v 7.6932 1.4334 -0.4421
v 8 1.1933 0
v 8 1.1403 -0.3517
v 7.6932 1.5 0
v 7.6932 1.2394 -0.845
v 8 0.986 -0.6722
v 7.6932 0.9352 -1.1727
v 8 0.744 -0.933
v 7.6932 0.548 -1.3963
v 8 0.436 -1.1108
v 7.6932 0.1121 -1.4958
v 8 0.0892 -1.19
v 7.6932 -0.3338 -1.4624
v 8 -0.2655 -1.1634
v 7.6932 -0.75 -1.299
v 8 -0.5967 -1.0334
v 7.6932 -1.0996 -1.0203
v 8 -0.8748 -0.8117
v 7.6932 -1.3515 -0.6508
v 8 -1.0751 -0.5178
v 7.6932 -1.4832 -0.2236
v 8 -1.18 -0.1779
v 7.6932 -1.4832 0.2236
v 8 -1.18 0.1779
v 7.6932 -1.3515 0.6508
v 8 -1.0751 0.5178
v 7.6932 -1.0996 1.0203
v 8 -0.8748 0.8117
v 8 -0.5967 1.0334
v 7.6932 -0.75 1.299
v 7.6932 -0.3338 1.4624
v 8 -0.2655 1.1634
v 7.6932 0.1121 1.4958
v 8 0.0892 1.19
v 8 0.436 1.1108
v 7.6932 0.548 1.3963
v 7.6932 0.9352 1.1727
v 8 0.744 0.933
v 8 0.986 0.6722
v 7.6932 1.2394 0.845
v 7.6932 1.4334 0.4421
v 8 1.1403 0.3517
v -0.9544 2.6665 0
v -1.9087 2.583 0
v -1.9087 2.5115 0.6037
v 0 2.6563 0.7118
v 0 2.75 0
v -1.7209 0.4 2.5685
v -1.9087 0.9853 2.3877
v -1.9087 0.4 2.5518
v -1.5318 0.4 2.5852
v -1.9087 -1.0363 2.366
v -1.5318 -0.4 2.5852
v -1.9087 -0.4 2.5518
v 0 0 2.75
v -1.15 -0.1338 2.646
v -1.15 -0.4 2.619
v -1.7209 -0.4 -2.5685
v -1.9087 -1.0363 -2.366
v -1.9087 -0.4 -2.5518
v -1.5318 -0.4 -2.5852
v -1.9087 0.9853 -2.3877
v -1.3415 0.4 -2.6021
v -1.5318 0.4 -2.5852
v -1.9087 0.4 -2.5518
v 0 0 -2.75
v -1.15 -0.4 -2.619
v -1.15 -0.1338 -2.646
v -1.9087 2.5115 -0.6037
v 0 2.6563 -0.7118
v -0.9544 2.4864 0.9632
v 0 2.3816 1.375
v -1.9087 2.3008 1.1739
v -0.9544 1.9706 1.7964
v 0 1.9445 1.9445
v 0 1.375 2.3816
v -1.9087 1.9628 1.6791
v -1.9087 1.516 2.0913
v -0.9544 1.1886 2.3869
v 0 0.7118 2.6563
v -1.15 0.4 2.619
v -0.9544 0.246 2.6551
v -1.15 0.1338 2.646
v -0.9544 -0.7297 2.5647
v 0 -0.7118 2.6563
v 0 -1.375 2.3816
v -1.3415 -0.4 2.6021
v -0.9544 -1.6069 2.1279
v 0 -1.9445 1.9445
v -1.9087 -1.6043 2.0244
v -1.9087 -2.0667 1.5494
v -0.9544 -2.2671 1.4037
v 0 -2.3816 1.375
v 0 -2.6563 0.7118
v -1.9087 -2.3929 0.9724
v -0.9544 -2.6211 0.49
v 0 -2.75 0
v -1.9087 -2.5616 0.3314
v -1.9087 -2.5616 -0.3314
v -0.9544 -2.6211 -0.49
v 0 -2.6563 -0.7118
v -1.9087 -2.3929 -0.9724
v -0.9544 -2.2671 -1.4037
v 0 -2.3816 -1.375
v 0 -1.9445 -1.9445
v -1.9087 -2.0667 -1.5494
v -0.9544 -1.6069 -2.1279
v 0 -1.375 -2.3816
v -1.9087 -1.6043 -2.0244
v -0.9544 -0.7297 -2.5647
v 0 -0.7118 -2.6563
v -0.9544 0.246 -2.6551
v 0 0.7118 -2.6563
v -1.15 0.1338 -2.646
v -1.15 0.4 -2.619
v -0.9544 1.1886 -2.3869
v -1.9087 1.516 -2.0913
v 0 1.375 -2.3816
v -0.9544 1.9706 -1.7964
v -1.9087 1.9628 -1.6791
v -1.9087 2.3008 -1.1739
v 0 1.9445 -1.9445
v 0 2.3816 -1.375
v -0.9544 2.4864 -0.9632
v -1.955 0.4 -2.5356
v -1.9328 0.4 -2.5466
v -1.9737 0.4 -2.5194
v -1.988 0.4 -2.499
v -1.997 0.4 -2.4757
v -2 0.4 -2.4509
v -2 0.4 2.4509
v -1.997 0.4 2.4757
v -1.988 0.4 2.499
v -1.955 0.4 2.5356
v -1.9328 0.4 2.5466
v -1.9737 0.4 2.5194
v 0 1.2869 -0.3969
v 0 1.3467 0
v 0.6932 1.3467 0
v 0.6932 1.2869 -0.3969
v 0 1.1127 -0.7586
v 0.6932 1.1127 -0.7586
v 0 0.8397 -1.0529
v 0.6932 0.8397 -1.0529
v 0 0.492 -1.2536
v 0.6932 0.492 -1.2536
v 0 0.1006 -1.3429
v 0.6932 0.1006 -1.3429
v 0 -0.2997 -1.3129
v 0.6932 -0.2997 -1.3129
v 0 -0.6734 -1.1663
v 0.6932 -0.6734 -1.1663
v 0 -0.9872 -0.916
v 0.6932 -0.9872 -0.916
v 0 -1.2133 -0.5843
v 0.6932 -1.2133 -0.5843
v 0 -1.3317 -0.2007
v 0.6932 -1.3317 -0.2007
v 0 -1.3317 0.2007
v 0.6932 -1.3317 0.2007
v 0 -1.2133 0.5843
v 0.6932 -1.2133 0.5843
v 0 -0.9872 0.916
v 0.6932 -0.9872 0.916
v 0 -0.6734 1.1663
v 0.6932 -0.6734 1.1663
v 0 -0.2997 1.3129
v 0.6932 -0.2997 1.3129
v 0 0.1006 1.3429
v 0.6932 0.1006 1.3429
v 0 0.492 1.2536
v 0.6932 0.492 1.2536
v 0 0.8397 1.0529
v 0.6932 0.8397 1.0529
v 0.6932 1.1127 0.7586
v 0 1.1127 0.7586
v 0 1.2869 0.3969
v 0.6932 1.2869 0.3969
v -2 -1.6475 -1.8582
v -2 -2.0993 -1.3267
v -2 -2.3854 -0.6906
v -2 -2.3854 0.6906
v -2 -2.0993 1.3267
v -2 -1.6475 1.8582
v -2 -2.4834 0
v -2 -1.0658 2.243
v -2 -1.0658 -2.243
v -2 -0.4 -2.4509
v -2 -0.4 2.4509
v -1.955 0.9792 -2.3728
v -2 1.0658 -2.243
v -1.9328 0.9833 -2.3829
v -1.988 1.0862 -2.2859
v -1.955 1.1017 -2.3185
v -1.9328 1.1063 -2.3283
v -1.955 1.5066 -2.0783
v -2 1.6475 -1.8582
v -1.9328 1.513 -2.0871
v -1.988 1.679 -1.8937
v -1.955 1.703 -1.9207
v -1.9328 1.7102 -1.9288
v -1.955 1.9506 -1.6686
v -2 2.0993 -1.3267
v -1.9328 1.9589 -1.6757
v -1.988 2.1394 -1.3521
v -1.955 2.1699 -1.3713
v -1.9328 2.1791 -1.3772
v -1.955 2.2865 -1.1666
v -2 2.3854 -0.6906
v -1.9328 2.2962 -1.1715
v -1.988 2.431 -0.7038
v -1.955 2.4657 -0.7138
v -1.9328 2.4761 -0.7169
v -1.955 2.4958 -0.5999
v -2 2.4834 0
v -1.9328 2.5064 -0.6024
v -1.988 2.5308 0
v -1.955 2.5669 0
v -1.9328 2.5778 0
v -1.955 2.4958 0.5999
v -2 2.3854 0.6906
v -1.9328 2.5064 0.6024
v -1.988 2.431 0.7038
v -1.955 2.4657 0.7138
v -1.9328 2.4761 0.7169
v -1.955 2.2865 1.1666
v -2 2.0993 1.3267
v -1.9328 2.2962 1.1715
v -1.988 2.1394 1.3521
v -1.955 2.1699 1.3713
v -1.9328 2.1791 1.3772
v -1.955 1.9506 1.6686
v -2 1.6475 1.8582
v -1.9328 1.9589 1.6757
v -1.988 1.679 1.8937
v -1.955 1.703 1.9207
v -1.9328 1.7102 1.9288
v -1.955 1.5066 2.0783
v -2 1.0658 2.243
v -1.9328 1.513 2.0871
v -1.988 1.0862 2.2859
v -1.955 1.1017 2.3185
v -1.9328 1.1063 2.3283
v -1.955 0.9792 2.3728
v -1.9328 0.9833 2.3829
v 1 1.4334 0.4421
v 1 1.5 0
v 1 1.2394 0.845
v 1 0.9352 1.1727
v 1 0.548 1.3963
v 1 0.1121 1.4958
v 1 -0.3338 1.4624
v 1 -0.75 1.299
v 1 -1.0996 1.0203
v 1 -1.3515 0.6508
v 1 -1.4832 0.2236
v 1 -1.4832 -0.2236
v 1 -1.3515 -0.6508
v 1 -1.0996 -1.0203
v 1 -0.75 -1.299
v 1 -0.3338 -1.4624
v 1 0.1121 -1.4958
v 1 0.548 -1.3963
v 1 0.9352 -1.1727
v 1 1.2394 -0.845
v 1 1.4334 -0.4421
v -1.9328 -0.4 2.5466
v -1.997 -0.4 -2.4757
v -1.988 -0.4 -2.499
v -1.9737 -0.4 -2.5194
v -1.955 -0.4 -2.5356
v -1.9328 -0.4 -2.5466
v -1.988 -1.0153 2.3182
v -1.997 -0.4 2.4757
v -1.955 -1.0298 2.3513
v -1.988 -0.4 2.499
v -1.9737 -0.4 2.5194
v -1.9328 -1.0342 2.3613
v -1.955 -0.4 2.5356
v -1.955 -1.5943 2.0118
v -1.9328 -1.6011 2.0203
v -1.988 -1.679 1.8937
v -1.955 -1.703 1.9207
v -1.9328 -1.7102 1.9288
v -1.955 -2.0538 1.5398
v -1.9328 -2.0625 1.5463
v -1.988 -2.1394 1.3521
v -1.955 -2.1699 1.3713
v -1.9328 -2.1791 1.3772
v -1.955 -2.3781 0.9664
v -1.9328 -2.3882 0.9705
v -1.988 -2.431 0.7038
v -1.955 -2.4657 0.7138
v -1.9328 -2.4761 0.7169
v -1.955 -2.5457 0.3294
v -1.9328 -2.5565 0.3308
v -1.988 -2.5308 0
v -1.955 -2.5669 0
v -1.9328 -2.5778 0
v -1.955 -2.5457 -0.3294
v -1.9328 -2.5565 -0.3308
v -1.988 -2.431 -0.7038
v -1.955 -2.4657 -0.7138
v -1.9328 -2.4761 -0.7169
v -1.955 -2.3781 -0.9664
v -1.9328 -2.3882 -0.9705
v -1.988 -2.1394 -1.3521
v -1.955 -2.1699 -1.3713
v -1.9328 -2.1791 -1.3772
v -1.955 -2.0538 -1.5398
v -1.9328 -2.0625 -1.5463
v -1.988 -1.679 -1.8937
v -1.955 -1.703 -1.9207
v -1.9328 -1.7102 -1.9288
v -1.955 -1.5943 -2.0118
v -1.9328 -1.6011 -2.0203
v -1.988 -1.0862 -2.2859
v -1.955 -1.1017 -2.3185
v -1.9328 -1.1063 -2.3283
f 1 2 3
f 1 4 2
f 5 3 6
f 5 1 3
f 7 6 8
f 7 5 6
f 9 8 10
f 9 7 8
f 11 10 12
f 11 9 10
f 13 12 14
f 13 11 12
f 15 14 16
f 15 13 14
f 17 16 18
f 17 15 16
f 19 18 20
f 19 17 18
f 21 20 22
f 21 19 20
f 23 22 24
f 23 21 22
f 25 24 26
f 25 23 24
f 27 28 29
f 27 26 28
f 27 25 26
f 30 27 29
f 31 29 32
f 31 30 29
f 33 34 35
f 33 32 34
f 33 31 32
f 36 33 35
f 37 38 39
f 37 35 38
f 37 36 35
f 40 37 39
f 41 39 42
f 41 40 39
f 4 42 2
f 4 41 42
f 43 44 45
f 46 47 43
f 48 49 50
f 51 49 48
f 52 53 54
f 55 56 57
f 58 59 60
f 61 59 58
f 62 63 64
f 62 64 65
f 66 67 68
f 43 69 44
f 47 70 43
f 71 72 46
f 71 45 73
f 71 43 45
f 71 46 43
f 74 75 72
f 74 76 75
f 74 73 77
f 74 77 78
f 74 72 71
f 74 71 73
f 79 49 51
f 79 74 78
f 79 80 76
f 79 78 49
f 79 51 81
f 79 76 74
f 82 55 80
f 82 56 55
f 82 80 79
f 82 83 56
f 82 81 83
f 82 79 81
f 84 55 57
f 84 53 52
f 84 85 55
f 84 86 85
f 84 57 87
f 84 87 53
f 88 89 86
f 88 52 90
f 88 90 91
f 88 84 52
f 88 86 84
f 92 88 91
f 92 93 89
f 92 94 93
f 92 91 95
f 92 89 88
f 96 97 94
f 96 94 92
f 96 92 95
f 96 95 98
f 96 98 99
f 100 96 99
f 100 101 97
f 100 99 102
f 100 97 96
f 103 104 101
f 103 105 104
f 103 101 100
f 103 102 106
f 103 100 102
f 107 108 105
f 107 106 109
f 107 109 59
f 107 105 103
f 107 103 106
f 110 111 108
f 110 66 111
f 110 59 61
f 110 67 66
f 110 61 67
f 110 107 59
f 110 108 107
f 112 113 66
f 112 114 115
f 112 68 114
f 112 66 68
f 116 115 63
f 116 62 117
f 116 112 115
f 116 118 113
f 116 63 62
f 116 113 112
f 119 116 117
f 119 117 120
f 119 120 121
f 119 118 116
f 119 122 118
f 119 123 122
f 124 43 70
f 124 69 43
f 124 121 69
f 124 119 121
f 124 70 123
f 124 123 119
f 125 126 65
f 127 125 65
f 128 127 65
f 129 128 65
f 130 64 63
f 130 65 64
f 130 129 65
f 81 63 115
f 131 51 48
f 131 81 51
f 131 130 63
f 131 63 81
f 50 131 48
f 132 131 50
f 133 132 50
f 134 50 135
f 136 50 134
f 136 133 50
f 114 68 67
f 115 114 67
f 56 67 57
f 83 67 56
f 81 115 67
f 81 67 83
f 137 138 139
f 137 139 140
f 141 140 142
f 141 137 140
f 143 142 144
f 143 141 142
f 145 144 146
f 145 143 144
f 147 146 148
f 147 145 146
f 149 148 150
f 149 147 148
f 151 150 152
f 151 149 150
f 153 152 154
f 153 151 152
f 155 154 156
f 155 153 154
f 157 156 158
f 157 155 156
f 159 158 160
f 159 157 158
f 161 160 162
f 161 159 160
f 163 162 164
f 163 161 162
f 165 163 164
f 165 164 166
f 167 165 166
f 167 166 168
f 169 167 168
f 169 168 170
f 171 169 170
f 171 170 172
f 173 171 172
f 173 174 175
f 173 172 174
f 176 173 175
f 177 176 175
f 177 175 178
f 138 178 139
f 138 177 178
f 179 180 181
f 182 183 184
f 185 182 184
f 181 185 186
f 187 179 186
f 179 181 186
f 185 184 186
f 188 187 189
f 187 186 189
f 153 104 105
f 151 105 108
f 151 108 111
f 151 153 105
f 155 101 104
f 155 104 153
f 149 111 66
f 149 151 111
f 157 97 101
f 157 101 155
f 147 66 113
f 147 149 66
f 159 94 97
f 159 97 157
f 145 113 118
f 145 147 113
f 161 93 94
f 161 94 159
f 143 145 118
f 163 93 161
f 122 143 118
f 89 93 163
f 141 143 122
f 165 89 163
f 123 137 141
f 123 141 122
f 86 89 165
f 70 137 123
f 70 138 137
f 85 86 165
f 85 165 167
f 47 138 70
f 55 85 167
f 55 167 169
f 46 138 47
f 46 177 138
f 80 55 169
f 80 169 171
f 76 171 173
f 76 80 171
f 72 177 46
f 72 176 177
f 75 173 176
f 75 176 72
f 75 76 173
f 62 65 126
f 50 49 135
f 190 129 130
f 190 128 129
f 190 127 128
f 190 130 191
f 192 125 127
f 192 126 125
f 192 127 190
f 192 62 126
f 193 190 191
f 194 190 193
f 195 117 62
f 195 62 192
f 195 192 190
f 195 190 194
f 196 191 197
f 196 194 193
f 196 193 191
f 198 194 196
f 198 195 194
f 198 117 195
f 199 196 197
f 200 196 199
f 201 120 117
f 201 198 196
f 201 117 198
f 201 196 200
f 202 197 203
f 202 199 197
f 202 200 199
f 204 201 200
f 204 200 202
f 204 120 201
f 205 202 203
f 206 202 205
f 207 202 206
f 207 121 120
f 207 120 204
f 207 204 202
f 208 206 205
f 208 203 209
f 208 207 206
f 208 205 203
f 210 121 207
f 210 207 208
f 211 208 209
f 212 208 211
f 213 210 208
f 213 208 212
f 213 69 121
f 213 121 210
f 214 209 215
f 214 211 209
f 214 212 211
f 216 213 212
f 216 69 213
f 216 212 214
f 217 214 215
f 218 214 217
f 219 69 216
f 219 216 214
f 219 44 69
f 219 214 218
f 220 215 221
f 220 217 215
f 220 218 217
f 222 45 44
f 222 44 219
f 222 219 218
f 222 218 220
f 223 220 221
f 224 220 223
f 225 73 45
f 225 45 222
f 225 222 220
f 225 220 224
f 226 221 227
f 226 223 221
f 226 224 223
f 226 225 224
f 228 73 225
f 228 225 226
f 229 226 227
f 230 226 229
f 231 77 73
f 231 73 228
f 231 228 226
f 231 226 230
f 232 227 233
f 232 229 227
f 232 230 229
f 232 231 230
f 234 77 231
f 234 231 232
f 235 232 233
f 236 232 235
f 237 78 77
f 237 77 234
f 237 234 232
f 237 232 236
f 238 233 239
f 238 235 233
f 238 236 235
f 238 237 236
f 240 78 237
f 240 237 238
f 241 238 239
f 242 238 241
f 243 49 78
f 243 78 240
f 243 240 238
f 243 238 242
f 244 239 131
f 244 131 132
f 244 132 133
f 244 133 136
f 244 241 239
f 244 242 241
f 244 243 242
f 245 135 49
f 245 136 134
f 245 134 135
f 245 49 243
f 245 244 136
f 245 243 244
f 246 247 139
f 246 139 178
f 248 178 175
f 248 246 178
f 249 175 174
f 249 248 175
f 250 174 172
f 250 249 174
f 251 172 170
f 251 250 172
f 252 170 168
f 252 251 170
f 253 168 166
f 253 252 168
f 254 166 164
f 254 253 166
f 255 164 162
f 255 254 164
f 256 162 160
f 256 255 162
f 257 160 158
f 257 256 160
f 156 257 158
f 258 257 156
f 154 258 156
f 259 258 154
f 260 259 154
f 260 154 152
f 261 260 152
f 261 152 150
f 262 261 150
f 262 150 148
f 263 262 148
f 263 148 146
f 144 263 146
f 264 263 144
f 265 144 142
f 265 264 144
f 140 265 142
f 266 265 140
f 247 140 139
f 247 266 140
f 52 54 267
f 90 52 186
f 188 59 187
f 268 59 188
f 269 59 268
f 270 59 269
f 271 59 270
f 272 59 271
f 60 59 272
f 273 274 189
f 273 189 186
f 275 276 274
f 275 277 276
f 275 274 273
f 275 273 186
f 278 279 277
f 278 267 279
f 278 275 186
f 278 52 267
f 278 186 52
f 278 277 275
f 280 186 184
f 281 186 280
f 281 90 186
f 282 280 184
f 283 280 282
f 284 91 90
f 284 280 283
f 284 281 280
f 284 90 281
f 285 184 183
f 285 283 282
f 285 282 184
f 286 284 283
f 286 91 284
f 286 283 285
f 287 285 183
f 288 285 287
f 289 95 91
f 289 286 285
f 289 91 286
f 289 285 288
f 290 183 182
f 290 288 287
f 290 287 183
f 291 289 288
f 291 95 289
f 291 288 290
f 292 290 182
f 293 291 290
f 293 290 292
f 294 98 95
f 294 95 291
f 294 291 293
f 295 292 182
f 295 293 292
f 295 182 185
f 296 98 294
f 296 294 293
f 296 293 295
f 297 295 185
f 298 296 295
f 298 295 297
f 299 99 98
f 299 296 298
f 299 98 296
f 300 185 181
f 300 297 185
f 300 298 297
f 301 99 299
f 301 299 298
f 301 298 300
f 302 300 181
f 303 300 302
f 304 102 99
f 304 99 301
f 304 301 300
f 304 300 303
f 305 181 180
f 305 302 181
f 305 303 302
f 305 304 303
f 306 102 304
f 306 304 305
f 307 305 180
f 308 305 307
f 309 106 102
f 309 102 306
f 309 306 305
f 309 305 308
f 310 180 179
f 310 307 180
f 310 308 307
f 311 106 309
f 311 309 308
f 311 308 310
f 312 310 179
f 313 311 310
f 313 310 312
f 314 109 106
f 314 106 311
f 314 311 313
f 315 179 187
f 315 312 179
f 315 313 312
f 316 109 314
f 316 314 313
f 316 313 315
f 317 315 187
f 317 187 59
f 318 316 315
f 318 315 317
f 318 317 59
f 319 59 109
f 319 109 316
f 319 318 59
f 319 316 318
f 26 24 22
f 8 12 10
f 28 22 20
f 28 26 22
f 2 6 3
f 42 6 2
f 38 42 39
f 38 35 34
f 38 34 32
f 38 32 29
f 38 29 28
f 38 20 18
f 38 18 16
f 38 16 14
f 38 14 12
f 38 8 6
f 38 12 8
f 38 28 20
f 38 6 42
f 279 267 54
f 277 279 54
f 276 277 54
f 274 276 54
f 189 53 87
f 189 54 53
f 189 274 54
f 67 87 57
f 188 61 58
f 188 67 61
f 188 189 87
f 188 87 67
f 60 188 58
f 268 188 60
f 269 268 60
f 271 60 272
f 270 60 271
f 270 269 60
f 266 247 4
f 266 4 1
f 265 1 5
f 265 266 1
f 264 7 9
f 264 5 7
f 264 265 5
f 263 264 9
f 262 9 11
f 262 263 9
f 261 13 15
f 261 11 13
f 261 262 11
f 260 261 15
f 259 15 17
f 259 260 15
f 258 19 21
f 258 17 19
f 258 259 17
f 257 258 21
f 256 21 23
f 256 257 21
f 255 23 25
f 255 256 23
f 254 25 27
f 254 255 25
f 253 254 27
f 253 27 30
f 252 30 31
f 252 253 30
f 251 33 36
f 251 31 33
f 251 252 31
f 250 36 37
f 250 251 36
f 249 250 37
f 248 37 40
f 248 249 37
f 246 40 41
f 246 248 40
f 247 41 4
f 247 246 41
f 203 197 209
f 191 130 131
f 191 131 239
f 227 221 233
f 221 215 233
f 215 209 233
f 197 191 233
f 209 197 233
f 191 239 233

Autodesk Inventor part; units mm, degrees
ref_plane "YZ Plane" through (0, 0, 0) normal (1, 0, 0) x (0, 1, 0)
ref_plane "XZ Plane" through (0, 0, 0) normal (0, 1, 0) x (-1, 0, 0)
sketch "Sketch1" plane through (0, 0, 0) normal (0, 0, 1) x (1, 0, 0)
  line L0 (-2, 0) -> (8, 0)
  line L1 (8, 0) -> (8, 1.5)
  line L2 (8, 1.5) -> (1, 1.5)
  line L3 (1, 1.5) -> (0.6932, 1.3467)
  line L4 (0.6932, 1.3467) -> (0, 1.3467)
  line L5 (0, 1.3467) -> (0, 2.75)
  line L6 (-4, 0) -> (10, 0) projected
  line L7 (0, -0.55) -> (0, 3.3) projected
  line L8 (-2, 0) -> (-2, 2.575)
  line L9 (0, 2.75) -> (-2, 2.575)
  line L10 (1, 1.5) -> (0, 1.5) construction
  dimension "d0" = 8
  dimension "d1" = 7
  dimension "d2" = 0.3068
  dimension "d3" = 2
  dimension "d4" = 3
  dimension "d5" = 2.6935
  dimension "d9" = 5.5
  dimension "d10" = 5
revolve "Body" add sketch "Sketch1" angle 360 about axis through (-2, 0, 0) along (1, 0, 0)
sketch "Sketch2" plane through (-2, 0, 0) normal (-1, 0, 0) x (0, 0, 1)
  circle A0 centre (0, 0) radius 2.75 projected
  line L0 (0, 0) -> (0, 2.575) projected
  line L1 (-2.75, 0.4) -> (2.75, 0.4)
  line L2 (2.75, 0.4) -> (2.75, -0.4)
  line L3 (2.75, -0.4) -> (-2.75, -0.4)
  line L4 (-2.75, -0.4) -> (-2.75, 0.4)
  line L5 (-2.75, 0) -> (2.75, 0) construction
  line L6 (0, 0.4) -> (0, -0.4) construction
  dimension "d11" = 0.8
  dimension "d12" = 5.5
fillet "Fillet1" radius 0.1 1 edges at (-2, -2.575, 0)
extrude "Slot" cut sketch "Sketch2" against normal blind 0.85 contours A0 L3 L1 | L2 L3 A0 | A0 L1 L2 | A0 L4 L1 | L3 L4 A0
thread "Thread" size "M3x0.5" class "6g" standard "ISO Metric profile" length 7
chamfer "Chamfer1" distance 0.3067 distance2 0.3068 1 edges at (8, -1.5, 0) measured on face at (8, 0.417, 0.2189)
ref_plane "Work Plane1" through (30.1625, 0, 0) normal (0, 0, -1) x (1, 0, 0)
equation "\"d11\" = SBR"
equation "\"d12\" = KOD"
equation "\"d19\" = STI"
equation "\"d14\" = RR"
equation "\"d15\" = GEL"
equation "\"d17\" = -0.5 * SPD + 0.5 * GD"
equation "\"d0\" = NLG"
equation "\"d1\" = GEL"
equation "\"d3\" = KOH"
equation "\"d4\" = GD"
equation "\"d5\" = BDM"
equation "\"d9\" = KOD"
equation "\"d10\" = KEWI"
equation "\"GD\" = NND"
equation "\"NLG\" = 8"
equation "\"GEL\" = 7"
equation "\"KOD\" = 5.5"
equation "\"KOH\" = 2"
equation "\"GAL\" = 0.61345 * PTC"
equation "\"SPD\" = NND - 1.2269 * PTC"
equation "\"BDM\" = 2.6935"
equation "\"GUL\" = 0.61345 * PTC"
equation "\"RR\" = 0.1"
equation "\"SBR\" = 0.8"
equation "\"STI\" = 0.85"
equation "\"KEWI\" = 5deg"
equation "\"PTC\" = 0.5"
equation "\"THREADDIA\" = 3"
equation "\"TOA\" = 30deg"
equation "\"NND\" = 3"
equation "\"GD1\" = THREADDIA - 1.2269 * PTC"
properties part number "ISO 1207 - M3 x 8" material "Stainless Steel, 440C"
